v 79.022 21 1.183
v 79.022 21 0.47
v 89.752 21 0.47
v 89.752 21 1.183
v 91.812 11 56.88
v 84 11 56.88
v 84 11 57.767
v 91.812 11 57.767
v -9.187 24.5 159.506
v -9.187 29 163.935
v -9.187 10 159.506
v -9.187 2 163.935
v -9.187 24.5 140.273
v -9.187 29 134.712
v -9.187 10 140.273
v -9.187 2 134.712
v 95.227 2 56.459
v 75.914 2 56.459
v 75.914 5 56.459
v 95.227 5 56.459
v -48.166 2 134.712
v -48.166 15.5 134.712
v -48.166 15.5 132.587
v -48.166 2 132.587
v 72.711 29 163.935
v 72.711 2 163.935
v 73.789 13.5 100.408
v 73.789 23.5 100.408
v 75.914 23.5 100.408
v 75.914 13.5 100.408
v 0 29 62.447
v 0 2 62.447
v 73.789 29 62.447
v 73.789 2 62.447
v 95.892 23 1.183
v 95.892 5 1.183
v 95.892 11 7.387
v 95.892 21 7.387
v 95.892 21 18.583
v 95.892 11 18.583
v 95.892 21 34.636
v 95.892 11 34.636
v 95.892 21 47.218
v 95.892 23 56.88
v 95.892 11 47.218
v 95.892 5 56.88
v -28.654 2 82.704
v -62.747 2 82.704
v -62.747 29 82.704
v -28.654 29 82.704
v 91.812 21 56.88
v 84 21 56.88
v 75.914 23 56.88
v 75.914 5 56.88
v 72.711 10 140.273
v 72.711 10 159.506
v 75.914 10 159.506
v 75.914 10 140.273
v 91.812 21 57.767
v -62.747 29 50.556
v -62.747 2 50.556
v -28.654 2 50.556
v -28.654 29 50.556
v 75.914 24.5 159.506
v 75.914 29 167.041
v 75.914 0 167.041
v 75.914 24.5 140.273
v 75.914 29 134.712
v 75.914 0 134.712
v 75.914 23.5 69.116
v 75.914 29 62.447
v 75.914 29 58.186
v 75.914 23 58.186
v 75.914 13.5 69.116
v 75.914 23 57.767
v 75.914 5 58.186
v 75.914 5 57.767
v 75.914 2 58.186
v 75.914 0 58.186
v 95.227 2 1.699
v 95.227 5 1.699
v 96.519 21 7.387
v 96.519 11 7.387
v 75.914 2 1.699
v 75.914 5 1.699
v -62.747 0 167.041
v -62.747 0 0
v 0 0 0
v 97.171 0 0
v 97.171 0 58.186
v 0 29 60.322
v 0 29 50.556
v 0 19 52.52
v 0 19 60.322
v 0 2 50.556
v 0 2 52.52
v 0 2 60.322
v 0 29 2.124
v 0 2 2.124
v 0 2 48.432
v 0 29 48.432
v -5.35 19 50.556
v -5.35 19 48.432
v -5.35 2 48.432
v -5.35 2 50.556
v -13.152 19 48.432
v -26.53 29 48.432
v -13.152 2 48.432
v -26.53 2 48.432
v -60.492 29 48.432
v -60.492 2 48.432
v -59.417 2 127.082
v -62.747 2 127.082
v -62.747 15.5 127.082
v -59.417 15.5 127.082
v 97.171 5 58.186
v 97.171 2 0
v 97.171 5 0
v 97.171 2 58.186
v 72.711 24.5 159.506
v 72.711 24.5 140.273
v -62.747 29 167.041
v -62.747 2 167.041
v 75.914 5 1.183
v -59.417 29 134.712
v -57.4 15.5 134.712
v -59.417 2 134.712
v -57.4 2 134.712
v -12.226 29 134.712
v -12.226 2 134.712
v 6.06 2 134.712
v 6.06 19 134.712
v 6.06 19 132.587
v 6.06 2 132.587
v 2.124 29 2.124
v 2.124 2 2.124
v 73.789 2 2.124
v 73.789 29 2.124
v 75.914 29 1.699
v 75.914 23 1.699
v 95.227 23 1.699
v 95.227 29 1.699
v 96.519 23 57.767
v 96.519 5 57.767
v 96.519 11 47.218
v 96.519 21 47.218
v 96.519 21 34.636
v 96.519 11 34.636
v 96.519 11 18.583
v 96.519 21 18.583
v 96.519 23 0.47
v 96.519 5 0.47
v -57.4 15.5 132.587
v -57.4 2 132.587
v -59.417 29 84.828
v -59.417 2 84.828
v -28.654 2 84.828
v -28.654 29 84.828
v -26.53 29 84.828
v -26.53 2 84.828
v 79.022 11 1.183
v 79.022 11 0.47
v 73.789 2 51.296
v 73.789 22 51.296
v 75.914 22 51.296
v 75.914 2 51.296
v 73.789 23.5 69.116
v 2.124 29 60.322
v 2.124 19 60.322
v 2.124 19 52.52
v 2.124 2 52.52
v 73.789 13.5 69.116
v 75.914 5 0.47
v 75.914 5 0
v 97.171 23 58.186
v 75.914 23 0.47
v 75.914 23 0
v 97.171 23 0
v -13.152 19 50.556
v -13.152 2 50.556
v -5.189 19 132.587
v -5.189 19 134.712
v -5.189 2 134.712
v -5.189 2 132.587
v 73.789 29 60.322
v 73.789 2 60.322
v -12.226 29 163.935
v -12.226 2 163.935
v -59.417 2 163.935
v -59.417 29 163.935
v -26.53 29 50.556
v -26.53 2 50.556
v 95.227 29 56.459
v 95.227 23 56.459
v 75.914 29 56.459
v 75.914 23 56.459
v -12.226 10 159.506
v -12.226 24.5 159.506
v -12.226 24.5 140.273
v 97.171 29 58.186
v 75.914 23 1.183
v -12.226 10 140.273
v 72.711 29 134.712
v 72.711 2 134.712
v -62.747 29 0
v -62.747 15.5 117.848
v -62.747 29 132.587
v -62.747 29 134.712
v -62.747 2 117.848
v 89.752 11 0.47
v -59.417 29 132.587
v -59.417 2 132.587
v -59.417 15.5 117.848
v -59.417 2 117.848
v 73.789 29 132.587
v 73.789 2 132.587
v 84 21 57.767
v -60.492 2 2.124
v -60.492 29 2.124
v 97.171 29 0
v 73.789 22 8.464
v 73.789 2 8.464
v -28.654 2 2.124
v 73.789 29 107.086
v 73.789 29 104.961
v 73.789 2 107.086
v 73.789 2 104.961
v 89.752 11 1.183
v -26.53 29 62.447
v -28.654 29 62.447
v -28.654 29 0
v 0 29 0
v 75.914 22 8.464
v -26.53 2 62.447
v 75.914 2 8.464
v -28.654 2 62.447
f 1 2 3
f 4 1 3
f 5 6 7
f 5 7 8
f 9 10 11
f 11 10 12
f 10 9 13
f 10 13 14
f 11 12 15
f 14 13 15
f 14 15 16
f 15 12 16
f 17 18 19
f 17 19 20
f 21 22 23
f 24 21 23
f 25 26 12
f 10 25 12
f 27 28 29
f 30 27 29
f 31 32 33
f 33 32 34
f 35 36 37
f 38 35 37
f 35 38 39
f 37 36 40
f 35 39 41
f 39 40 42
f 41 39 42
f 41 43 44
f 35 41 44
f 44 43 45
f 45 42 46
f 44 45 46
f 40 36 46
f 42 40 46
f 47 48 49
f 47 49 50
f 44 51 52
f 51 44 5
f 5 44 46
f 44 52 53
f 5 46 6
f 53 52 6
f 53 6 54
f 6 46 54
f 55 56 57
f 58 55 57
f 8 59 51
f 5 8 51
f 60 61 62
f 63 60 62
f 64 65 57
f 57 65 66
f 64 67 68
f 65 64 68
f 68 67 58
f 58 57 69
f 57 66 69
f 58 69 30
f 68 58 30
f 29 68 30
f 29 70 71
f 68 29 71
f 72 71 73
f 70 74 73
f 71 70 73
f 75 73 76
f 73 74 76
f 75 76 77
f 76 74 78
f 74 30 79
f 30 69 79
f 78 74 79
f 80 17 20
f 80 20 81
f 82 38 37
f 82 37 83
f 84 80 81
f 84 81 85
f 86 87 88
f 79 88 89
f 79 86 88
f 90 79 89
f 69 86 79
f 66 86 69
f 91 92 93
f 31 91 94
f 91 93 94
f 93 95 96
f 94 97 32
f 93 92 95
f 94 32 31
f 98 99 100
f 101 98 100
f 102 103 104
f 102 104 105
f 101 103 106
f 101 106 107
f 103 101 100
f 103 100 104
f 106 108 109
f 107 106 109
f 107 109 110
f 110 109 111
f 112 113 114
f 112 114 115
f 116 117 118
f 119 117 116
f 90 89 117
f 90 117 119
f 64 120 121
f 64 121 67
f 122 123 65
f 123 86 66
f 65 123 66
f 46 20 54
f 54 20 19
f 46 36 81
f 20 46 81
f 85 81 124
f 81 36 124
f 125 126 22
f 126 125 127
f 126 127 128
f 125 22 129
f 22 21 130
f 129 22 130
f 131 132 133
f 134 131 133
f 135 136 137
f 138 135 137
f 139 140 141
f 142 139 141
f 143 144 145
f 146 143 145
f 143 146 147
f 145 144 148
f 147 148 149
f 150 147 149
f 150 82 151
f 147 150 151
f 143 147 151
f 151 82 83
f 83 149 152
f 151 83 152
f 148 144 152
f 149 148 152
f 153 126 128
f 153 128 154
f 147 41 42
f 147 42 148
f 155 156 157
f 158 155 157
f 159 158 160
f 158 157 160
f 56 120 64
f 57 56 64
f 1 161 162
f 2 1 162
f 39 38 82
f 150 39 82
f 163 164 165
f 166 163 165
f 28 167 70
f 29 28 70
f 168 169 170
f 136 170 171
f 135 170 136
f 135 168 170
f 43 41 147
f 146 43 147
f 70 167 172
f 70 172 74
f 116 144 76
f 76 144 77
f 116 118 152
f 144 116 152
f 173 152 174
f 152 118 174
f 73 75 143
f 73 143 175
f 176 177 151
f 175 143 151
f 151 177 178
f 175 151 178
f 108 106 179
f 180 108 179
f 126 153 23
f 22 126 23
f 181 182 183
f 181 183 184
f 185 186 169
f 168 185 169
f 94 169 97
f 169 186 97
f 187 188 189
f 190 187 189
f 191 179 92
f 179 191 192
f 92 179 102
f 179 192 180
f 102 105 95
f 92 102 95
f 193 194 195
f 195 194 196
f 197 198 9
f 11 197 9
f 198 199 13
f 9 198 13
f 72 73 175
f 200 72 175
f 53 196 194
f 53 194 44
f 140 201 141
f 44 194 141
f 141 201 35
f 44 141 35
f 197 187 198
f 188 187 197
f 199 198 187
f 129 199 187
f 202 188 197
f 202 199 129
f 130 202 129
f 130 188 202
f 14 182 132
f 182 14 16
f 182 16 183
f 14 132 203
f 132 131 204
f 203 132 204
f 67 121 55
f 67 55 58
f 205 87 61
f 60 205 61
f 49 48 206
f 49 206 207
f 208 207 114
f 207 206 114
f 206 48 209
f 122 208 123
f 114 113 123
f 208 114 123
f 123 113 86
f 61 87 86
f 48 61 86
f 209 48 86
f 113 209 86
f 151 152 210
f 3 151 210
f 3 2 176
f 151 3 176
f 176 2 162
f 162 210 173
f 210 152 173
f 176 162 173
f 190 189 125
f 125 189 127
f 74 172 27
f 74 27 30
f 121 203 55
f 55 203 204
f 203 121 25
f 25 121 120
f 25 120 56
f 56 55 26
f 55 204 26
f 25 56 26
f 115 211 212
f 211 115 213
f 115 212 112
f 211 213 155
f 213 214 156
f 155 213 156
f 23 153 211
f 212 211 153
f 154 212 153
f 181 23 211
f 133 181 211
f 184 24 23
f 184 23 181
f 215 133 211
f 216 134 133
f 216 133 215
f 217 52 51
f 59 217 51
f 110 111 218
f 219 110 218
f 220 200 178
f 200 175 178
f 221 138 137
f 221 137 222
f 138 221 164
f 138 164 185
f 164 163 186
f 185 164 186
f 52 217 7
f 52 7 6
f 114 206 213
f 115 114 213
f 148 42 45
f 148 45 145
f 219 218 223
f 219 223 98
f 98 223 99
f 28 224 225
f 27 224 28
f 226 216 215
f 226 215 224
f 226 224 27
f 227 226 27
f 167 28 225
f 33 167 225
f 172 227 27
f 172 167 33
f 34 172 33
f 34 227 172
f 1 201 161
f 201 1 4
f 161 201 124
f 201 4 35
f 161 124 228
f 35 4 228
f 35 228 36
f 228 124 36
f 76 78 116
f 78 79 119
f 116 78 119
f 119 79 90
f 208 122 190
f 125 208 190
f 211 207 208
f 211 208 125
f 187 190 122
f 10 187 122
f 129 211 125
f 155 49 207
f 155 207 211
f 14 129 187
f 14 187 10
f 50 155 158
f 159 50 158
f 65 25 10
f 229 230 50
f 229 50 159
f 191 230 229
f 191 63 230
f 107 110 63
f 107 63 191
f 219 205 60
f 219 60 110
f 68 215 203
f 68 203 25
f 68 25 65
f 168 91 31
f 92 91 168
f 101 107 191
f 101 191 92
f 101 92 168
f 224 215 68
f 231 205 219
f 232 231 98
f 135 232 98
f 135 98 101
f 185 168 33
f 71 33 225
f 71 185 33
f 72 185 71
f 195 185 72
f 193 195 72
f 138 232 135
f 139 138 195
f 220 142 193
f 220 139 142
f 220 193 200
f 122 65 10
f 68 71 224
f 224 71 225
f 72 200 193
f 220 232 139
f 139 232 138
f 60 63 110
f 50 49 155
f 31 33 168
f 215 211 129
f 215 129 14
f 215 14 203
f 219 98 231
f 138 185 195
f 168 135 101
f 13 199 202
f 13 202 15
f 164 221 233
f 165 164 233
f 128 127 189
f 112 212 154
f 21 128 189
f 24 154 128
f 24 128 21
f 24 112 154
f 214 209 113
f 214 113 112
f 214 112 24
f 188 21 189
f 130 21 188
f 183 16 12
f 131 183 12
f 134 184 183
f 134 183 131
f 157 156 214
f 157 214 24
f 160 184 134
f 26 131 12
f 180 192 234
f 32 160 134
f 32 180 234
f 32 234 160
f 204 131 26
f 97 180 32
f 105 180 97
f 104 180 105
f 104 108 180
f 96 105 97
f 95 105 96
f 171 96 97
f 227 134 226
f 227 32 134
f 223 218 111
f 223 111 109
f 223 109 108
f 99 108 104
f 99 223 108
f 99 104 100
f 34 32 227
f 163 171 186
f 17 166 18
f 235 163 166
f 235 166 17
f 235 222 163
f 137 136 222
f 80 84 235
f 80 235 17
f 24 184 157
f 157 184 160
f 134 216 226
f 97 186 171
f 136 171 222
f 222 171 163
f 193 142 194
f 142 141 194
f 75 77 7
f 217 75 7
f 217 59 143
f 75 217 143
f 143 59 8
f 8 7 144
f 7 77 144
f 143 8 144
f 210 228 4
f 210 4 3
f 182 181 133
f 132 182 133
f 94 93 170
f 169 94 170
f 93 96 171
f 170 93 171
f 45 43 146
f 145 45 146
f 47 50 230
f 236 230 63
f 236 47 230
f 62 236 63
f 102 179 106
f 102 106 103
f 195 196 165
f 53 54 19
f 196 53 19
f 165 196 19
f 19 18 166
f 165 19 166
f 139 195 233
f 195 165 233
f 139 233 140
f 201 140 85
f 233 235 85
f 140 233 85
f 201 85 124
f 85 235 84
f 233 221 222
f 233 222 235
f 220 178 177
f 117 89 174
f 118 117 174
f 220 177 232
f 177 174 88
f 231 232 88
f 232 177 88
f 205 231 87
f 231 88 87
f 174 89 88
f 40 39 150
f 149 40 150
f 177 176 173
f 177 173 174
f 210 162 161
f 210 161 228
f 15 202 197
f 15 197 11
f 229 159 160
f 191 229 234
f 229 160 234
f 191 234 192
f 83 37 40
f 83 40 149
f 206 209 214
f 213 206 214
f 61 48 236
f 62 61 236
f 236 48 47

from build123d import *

# Parameters (mm, degrees)
SKETCH_1_W          = 75.913642727
SKETCH_1_H          = 62.446702165
EXTRUDE_1_DEPTH     = 2
EXTRUDE_2_DEPTH     = 27
CUT_EXTRUDE_START   = -7
SKETCH_3_W          = 2.124318213
SKETCH_3_H          = 42.832192033
CUT_EXTRUDE_1_DEPTH = 20
SKETCH_4_W          = 2.124318213
SKETCH_4_H          = 7.801964605
EXTRUDE_3_DEPTH     = 10
SKETCH_5_W          = 75.913642727
SKETCH_5_H          = 72.264822367
EXTRUDE_4_DEPTH     = 2
SKETCH_6_W          = 2.124318213
SKETCH_6_H          = 74.38914058
EXTRUDE_5_DEPTH     = 27
SKETCH_7_W          = 21.257465039
SKETCH_7_H          = 58.185991571
EXTRUDE_6_DEPTH     = 2
EXTRUDE_7_DEPTH     = 3
EXTRUDE_START       = 18
EXTRUDE_8_DEPTH     = 3
EXTRUDE_9_DEPTH     = 3
EXTRUDE_10_DEPTH    = 21
CUT_EXTRUDE_START_2 = -8
SKETCH_12_W         = 10.730208879
SKETCH_12_H         = 1.699417316
SKETCH_12_W_2       = 1.944586737
SKETCH_12_H_2       = 11.195277622
SKETCH_12_H_3       = 12.58207638
SKETCH_12_W_3       = 7.811884166
SKETCH_12_H_4       = 1.726665101
CUT_EXTRUDE_2_DEPTH = 10
CUT_EXTRUDE_START_3 = -5.5
SKETCH_13_W         = 2.124318213
SKETCH_13_H         = 31.292512657
CUT_EXTRUDE_3_DEPTH = 10
SKETCH_14_W         = 73.789324514
SKETCH_14_H         = 2.124318213
EXTRUDE_11_DEPTH    = 27
SKETCH_15_W         = 28.654102471
SKETCH_15_H         = 134.711524532
EXTRUDE_12_DEPTH    = 2
SKETCH_16_W         = 28.654102471
SKETCH_16_H         = 2.124318213
SKETCH_16_W_2       = 26.529784258
EXTRUDE_13_DEPTH    = 27
SKETCH_17_W         = 34.092899776
SKETCH_17_H         = 134.711524532
EXTRUDE_14_DEPTH    = 2
SKETCH_18_W         = 2.255075416
SKETCH_18_H         = 46.30769884
EXTRUDE_15_DEPTH    = 27
SKETCH_19_W         = 7.801964605
SKETCH_19_H         = 7.760030918
CUT_EXTRUDE_4_DEPTH = 17
SKETCH_20_W         = 2.124318213
SKETCH_20_H         = 22.381297739
SKETCH_20_W_2       = 34.092899776
SKETCH_20_H_2       = 2.124318213
EXTRUDE_16_DEPTH    = 27
SKETCH_22_W         = 138.660644974
SKETCH_22_H         = 32.329085963
EXTRUDE_17_DEPTH    = 2
SKETCH_23_W         = 136.536326761
SKETCH_23_H         = 2.124318213
EXTRUDE_18_DEPTH    = 27
CUT_EXTRUDE_START_4 = -27
SKETCH_24_W         = 73.789324514
SKETCH_24_H         = 2.124318213
CUT_EXTRUDE_5_DEPTH = 27
SKETCH_25_W         = 3.039057747
SKETCH_25_H         = 29.223543377
EXTRUDE_19_DEPTH    = 27
CUT_EXTRUDE_START_5 = -4.5
SKETCH_26_W         = 88.139659128
SKETCH_26_H         = 19.232592482
CUT_EXTRUDE_6_DEPTH = 14.5
SKETCH_27_W         = 11.249085033
SKETCH_27_H         = 2.124318213
CUT_EXTRUDE_7_DEPTH = 17
SKETCH_28_W         = 3.329603522
SKETCH_28_H         = 47.759206415
SKETCH_28_H_2       = 31.34786159
EXTRUDE_20_DEPTH    = 27
SKETCH_29_W         = 9.233976249
SKETCH_29_H         = 2.124318213
SKETCH_29_W_2       = 3.329603522
SKETCH_29_H_2       = 9.234531485
CUT_EXTRUDE_8_DEPTH = 13.5


with BuildPart() as part:
    # 草图1 → 凸台-拉伸1 (new body)
    with BuildSketch(Plane(origin=(0, 0, 0), x_dir=(1, 0, 0), z_dir=(0, 1, 0))):
        with Locations((37.956821364, -31.223351083)):
            Rectangle(SKETCH_1_W, SKETCH_1_H)
    extrude(amount=EXTRUDE_1_DEPTH)

    # 草图2 → 凸台-拉伸2 (add)
    with BuildSketch(Plane(origin=(0, 2, 0), x_dir=(1, 0, 0), z_dir=(0, 1, 0))):
        Polygon((0, -62.446702165), (75.913642727, -62.446702165), (75.913642727, 0), (0, 0), (0, -52.520419347), (2.124318213, -52.520419347), (2.124318213, -2.124318213), (73.789324514, -2.124318213), (73.789324514, -60.322383952), (68.344319435, -60.322383952), (0, -60.322383952), align=None)
    extrude(amount=EXTRUDE_2_DEPTH)

    # 草图3 → 切除-拉伸1 (cut)
    with BuildSketch(Plane(origin=(0, 29, 0), x_dir=(1, 0, 0), z_dir=(0, 1, 0)).offset(CUT_EXTRUDE_START)):
        with Locations((74.851483621, -29.879654035)):
            Rectangle(SKETCH_3_W, SKETCH_3_H)
    extrude(amount=-CUT_EXTRUDE_1_DEPTH, mode=Mode.SUBTRACT)

    # 草图4 → 凸台-拉伸3 (add)
    with BuildSketch(Plane(origin=(0, 29, 0), x_dir=(1, 0, 0), z_dir=(0, 1, 0))):
        with Locations((1.062159107, -56.421401649)):
            Rectangle(SKETCH_4_W, SKETCH_4_H)
    extrude(amount=-EXTRUDE_3_DEPTH)

    # 草图5 → 凸台-拉伸4 (add)
    with BuildSketch(Plane.XZ):
        with Locations((37.956821364, 98.579113349)):
            Rectangle(SKETCH_5_W, SKETCH_5_H)
    extrude(amount=-EXTRUDE_4_DEPTH)

    # 草图6 → 凸台-拉伸5 (add)
    with BuildSketch(Plane(origin=(0, 2, 0), x_dir=(1, 0, 0), z_dir=(0, 1, 0))):
        with Locations((74.851483621, -97.516954242)):
            Rectangle(SKETCH_6_W, SKETCH_6_H)
    extrude(amount=EXTRUDE_5_DEPTH)

    # 草图7 → 凸台-拉伸6 (add)
    with BuildSketch(Plane.XZ):
        with Locations((86.542375247, 29.092995786)):
            Rectangle(SKETCH_7_W, SKETCH_7_H)
    extrude(amount=-EXTRUDE_6_DEPTH)

    # 草图8 → 凸台-拉伸7 (add)
    with BuildSketch(Plane(origin=(0, 2, 0), x_dir=(1, 0, 0), z_dir=(0, 1, 0))):
        Polygon((75.913642727, -58.185991571), (75.913642727, -56.45932647), (95.226521029, -56.45932647), (95.226521029, -1.699417316), (75.913642727, -1.699417316), (75.913642727, 0), (97.171107766, 0), (97.171107766, -58.185991571), align=None)
    extrude(amount=EXTRUDE_7_DEPTH)

    # 草图9 → 凸台-拉伸8 (add)
    with BuildSketch(Plane(origin=(0, 5, 0), x_dir=(1, 0, 0), z_dir=(0, 1, 0)).offset(EXTRUDE_START)):
        Polygon((75.913642727, -58.185991571), (97.171107766, -58.185991571), (97.171107766, 0), (75.913642727, 0), (75.913642727, -1.699417316), (95.226521029, -1.699417316), (95.226521029, -56.45932647), (75.913642727, -56.45932647), align=None)
    extrude(amount=EXTRUDE_8_DEPTH)

    # 草图10 → 凸台-拉伸9 (add)
    with BuildSketch(Plane(origin=(0, 26, 0), x_dir=(1, 0, 0), z_dir=(0, 1, 0))):
        Polygon((75.913642727, -56.45932647), (75.913642727, -58.185991571), (97.171107766, -58.185991571), (97.171107766, 0), (75.913642727, 0), (75.913642727, -1.699417316), (95.226521029, -1.699417316), (95.226521029, -56.45932647), align=None)
    extrude(amount=EXTRUDE_9_DEPTH)

    # 草图11 → 凸台-拉伸10 (add)
    with BuildSketch(Plane(origin=(0, 5, 0), x_dir=(1, 0, 0), z_dir=(0, 1, 0))):
        Polygon((75.913642727, -56.879985146), (75.913642727, -57.767002905), (96.519280812, -57.767002905), (96.519280812, -0.469783288), (75.913642727, -0.469783288), (75.913642727, -1.183025895), (95.892442802, -1.183025895), (95.892442802, -56.879985146), align=None)
    extrude(amount=EXTRUDE_10_DEPTH)

    # 草图12 → 切除-拉伸2 (cut)
    with BuildSketch(Plane(origin=(0, 29, 0), x_dir=(1, 0, 0), z_dir=(0, 1, 0)).offset(CUT_EXTRUDE_START_2)):
        with Locations((84.386634544, -0.849708658)):
            Rectangle(SKETCH_12_W, SKETCH_12_H)
        with Locations((96.198814398, -12.98486795)):
            Rectangle(SKETCH_12_W_2, SKETCH_12_H_2)
        with Locations((96.198814398, -40.926726277)):
            Rectangle(SKETCH_12_W_2, SKETCH_12_H_3)
        with Locations((87.905733133, -57.32265902)):
            Rectangle(SKETCH_12_W_3, SKETCH_12_H_4)
    extrude(amount=-CUT_EXTRUDE_2_DEPTH, mode=Mode.SUBTRACT)

    # 草图13 → 切除-拉伸3 (cut)
    with BuildSketch(Plane(origin=(0, 29, 0), x_dir=(1, 0, 0), z_dir=(0, 1, 0)).offset(CUT_EXTRUDE_START_3)):
        with Locations((74.851483621, -84.761912061)):
            Rectangle(SKETCH_13_W, SKETCH_13_H)
    extrude(amount=-CUT_EXTRUDE_3_DEPTH, mode=Mode.SUBTRACT)

    # 草图14 → 凸台-拉伸11 (add)
    with BuildSketch(Plane(origin=(0, 2, 0), x_dir=(1, 0, 0), z_dir=(0, 1, 0))):
        with Locations((36.894662257, -106.023590927)):
            Rectangle(SKETCH_14_W, SKETCH_14_H)
    extrude(amount=EXTRUDE_11_DEPTH)

    # 草图15 → 凸台-拉伸12 (add)
    with BuildSketch(Plane.XZ):
        with Locations((-14.327051236, 67.355762266)):
            Rectangle(SKETCH_15_W, SKETCH_15_H)
    extrude(amount=-EXTRUDE_12_DEPTH)

    # 草图16 → 凸台-拉伸13 (add)
    with BuildSketch(Plane(origin=(0, 2, 0), x_dir=(1, 0, 0), z_dir=(0, 1, 0))):
        with Locations((-14.327051236, -1.062159107)):
            Rectangle(SKETCH_16_W, SKETCH_16_H)
        with Locations((-13.264892129, -49.49417616)):
            Rectangle(SKETCH_16_W_2, SKETCH_16_H)
        Polygon((-28.654102471, -62.446702165), (-26.529784258, -62.446702165), (-26.529784258, -50.556335266), (-26.529784258, -48.432017053), (-28.654102471, -48.432017053), align=None)
    extrude(amount=EXTRUDE_13_DEPTH)

    # 草图17 → 凸台-拉伸14 (add)
    with BuildSketch(Plane.XZ):
        with Locations((-45.700552359, 67.355762266)):
            Rectangle(SKETCH_17_W, SKETCH_17_H)
    extrude(amount=-EXTRUDE_14_DEPTH)

    # 草图18 → 凸台-拉伸15 (add)
    with BuildSketch(Plane(origin=(0, 2, 0), x_dir=(1, 0, 0), z_dir=(0, 1, 0))):
        Polygon((-60.491926831, -2.124318213), (-28.654102471, -2.124318213), (-28.654102471, 0), (-62.747002247, 0), (-62.747002247, -2.124318213), align=None)
        with Locations((-61.619464539, -25.278167633)):
            Rectangle(SKETCH_18_W, SKETCH_18_H)
        Polygon((-26.529784258, -48.432017053), (-60.491926831, -48.432017053), (-62.747002247, -48.432017053), (-62.747002247, -50.556335266), (-26.529784258, -50.556335266), align=None)
    extrude(amount=EXTRUDE_15_DEPTH)

    # 草图19 → 切除-拉伸4 (cut)
    with BuildSketch(Plane.XZ.offset(-19)):
        with Locations((-9.25141008, 48.683171807)):
            Rectangle(SKETCH_19_W, SKETCH_19_H)
    extrude(amount=CUT_EXTRUDE_4_DEPTH, mode=Mode.SUBTRACT)

    # 草图20 → 凸台-拉伸16 (add)
    with BuildSketch(Plane(origin=(0, 2, 0), x_dir=(1, 0, 0), z_dir=(0, 1, 0))):
        with Locations((-27.591943365, -73.637351034)):
            Rectangle(SKETCH_20_W, SKETCH_20_H)
        with Locations((-45.700552359, -83.765840798)):
            Rectangle(SKETCH_20_W_2, SKETCH_20_H_2)
    extrude(amount=EXTRUDE_16_DEPTH)

    # 草图22 → 凸台-拉伸17 (add)
    with BuildSketch(Plane.XZ):
        with Locations((6.58332024, 150.876067514)):
            Rectangle(SKETCH_22_W, SKETCH_22_H)
    extrude(amount=-EXTRUDE_17_DEPTH)

    # 草图23 → 凸台-拉伸18 (add)
    with BuildSketch(Plane(origin=(0, 2, 0), x_dir=(1, 0, 0), z_dir=(0, 1, 0))):
        with Locations((5.521161133, -133.649365426)):
            Rectangle(SKETCH_23_W, SKETCH_23_H)
    extrude(amount=EXTRUDE_18_DEPTH)

    # 草图24 → 切除-拉伸5 (cut)
    with BuildSketch(Plane(origin=(0, 29, 0), x_dir=(1, 0, 0), z_dir=(0, 1, 0)).offset(CUT_EXTRUDE_START_4)):
        with Locations((36.894662257, -106.023590927)):
            Rectangle(SKETCH_24_W, SKETCH_24_H)
    extrude(amount=CUT_EXTRUDE_5_DEPTH, mode=Mode.SUBTRACT)

    # 草图25 → 凸台-拉伸19 (add)
    with BuildSketch(Plane(origin=(0, 2, 0), x_dir=(1, 0, 0), z_dir=(0, 1, 0))):
        Polygon((75.913642727, -167.040610495), (75.913642727, -134.711524532), (72.710667325, -134.711524532), (72.710667325, -163.935067909), (72.710667325, -167.040610495), align=None)
        Polygon((72.710667325, -167.040610495), (72.710667325, -163.935067909), (-9.186958654, -163.935067909), (-12.226016401, -163.935067909), (-62.747002247, -163.935067909), (-62.747002247, -167.040610495), align=None)
        with Locations((-10.706487528, -149.32329622)):
            Rectangle(SKETCH_25_W, SKETCH_25_H)
    extrude(amount=EXTRUDE_19_DEPTH)

    # 草图26 → 切除-拉伸6 (cut)
    with BuildSketch(Plane(origin=(0, 29, 0), x_dir=(1, 0, 0), z_dir=(0, 1, 0)).offset(CUT_EXTRUDE_START_5)):
        with Locations((31.843813163, -149.88949865)):
            Rectangle(SKETCH_26_W, SKETCH_26_H)
    extrude(amount=-CUT_EXTRUDE_6_DEPTH, mode=Mode.SUBTRACT)

    # 草图27 → 切除-拉伸7 (cut)
    with BuildSketch(Plane(origin=(0, 29, 0), x_dir=(1, 0, 0), z_dir=(0, 1, 0)).offset(CUT_EXTRUDE_START_4)):
        with Locations((0.435624052, -133.649365426)):
            Rectangle(SKETCH_27_W, SKETCH_27_H)
    extrude(amount=CUT_EXTRUDE_7_DEPTH, mode=Mode.SUBTRACT)

    # 草图28 → 凸台-拉伸20 (add)
    with BuildSketch(Plane(origin=(0, 2, 0), x_dir=(1, 0, 0), z_dir=(0, 1, 0))):
        with Locations((-61.082200486, -108.707603112)):
            Rectangle(SKETCH_28_W, SKETCH_28_H)
        with Locations((-61.082200486, -148.261137114)):
            Rectangle(SKETCH_28_W, SKETCH_28_H_2)
    extrude(amount=EXTRUDE_20_DEPTH)

    # 草图29 → 切除-拉伸8 (cut)
    with BuildSketch(Plane(origin=(0, 29, 0), x_dir=(1, 0, 0), z_dir=(0, 1, 0)).offset(CUT_EXTRUDE_START_4)):
        with Locations((-52.783158211, -133.649365426)):
            Rectangle(SKETCH_29_W, SKETCH_29_H)
        with Locations((-61.082200486, -122.464998081)):
            Rectangle(SKETCH_29_W_2, SKETCH_29_H_2)
    extrude(amount=CUT_EXTRUDE_8_DEPTH, mode=Mode.SUBTRACT)


solid = part.part
